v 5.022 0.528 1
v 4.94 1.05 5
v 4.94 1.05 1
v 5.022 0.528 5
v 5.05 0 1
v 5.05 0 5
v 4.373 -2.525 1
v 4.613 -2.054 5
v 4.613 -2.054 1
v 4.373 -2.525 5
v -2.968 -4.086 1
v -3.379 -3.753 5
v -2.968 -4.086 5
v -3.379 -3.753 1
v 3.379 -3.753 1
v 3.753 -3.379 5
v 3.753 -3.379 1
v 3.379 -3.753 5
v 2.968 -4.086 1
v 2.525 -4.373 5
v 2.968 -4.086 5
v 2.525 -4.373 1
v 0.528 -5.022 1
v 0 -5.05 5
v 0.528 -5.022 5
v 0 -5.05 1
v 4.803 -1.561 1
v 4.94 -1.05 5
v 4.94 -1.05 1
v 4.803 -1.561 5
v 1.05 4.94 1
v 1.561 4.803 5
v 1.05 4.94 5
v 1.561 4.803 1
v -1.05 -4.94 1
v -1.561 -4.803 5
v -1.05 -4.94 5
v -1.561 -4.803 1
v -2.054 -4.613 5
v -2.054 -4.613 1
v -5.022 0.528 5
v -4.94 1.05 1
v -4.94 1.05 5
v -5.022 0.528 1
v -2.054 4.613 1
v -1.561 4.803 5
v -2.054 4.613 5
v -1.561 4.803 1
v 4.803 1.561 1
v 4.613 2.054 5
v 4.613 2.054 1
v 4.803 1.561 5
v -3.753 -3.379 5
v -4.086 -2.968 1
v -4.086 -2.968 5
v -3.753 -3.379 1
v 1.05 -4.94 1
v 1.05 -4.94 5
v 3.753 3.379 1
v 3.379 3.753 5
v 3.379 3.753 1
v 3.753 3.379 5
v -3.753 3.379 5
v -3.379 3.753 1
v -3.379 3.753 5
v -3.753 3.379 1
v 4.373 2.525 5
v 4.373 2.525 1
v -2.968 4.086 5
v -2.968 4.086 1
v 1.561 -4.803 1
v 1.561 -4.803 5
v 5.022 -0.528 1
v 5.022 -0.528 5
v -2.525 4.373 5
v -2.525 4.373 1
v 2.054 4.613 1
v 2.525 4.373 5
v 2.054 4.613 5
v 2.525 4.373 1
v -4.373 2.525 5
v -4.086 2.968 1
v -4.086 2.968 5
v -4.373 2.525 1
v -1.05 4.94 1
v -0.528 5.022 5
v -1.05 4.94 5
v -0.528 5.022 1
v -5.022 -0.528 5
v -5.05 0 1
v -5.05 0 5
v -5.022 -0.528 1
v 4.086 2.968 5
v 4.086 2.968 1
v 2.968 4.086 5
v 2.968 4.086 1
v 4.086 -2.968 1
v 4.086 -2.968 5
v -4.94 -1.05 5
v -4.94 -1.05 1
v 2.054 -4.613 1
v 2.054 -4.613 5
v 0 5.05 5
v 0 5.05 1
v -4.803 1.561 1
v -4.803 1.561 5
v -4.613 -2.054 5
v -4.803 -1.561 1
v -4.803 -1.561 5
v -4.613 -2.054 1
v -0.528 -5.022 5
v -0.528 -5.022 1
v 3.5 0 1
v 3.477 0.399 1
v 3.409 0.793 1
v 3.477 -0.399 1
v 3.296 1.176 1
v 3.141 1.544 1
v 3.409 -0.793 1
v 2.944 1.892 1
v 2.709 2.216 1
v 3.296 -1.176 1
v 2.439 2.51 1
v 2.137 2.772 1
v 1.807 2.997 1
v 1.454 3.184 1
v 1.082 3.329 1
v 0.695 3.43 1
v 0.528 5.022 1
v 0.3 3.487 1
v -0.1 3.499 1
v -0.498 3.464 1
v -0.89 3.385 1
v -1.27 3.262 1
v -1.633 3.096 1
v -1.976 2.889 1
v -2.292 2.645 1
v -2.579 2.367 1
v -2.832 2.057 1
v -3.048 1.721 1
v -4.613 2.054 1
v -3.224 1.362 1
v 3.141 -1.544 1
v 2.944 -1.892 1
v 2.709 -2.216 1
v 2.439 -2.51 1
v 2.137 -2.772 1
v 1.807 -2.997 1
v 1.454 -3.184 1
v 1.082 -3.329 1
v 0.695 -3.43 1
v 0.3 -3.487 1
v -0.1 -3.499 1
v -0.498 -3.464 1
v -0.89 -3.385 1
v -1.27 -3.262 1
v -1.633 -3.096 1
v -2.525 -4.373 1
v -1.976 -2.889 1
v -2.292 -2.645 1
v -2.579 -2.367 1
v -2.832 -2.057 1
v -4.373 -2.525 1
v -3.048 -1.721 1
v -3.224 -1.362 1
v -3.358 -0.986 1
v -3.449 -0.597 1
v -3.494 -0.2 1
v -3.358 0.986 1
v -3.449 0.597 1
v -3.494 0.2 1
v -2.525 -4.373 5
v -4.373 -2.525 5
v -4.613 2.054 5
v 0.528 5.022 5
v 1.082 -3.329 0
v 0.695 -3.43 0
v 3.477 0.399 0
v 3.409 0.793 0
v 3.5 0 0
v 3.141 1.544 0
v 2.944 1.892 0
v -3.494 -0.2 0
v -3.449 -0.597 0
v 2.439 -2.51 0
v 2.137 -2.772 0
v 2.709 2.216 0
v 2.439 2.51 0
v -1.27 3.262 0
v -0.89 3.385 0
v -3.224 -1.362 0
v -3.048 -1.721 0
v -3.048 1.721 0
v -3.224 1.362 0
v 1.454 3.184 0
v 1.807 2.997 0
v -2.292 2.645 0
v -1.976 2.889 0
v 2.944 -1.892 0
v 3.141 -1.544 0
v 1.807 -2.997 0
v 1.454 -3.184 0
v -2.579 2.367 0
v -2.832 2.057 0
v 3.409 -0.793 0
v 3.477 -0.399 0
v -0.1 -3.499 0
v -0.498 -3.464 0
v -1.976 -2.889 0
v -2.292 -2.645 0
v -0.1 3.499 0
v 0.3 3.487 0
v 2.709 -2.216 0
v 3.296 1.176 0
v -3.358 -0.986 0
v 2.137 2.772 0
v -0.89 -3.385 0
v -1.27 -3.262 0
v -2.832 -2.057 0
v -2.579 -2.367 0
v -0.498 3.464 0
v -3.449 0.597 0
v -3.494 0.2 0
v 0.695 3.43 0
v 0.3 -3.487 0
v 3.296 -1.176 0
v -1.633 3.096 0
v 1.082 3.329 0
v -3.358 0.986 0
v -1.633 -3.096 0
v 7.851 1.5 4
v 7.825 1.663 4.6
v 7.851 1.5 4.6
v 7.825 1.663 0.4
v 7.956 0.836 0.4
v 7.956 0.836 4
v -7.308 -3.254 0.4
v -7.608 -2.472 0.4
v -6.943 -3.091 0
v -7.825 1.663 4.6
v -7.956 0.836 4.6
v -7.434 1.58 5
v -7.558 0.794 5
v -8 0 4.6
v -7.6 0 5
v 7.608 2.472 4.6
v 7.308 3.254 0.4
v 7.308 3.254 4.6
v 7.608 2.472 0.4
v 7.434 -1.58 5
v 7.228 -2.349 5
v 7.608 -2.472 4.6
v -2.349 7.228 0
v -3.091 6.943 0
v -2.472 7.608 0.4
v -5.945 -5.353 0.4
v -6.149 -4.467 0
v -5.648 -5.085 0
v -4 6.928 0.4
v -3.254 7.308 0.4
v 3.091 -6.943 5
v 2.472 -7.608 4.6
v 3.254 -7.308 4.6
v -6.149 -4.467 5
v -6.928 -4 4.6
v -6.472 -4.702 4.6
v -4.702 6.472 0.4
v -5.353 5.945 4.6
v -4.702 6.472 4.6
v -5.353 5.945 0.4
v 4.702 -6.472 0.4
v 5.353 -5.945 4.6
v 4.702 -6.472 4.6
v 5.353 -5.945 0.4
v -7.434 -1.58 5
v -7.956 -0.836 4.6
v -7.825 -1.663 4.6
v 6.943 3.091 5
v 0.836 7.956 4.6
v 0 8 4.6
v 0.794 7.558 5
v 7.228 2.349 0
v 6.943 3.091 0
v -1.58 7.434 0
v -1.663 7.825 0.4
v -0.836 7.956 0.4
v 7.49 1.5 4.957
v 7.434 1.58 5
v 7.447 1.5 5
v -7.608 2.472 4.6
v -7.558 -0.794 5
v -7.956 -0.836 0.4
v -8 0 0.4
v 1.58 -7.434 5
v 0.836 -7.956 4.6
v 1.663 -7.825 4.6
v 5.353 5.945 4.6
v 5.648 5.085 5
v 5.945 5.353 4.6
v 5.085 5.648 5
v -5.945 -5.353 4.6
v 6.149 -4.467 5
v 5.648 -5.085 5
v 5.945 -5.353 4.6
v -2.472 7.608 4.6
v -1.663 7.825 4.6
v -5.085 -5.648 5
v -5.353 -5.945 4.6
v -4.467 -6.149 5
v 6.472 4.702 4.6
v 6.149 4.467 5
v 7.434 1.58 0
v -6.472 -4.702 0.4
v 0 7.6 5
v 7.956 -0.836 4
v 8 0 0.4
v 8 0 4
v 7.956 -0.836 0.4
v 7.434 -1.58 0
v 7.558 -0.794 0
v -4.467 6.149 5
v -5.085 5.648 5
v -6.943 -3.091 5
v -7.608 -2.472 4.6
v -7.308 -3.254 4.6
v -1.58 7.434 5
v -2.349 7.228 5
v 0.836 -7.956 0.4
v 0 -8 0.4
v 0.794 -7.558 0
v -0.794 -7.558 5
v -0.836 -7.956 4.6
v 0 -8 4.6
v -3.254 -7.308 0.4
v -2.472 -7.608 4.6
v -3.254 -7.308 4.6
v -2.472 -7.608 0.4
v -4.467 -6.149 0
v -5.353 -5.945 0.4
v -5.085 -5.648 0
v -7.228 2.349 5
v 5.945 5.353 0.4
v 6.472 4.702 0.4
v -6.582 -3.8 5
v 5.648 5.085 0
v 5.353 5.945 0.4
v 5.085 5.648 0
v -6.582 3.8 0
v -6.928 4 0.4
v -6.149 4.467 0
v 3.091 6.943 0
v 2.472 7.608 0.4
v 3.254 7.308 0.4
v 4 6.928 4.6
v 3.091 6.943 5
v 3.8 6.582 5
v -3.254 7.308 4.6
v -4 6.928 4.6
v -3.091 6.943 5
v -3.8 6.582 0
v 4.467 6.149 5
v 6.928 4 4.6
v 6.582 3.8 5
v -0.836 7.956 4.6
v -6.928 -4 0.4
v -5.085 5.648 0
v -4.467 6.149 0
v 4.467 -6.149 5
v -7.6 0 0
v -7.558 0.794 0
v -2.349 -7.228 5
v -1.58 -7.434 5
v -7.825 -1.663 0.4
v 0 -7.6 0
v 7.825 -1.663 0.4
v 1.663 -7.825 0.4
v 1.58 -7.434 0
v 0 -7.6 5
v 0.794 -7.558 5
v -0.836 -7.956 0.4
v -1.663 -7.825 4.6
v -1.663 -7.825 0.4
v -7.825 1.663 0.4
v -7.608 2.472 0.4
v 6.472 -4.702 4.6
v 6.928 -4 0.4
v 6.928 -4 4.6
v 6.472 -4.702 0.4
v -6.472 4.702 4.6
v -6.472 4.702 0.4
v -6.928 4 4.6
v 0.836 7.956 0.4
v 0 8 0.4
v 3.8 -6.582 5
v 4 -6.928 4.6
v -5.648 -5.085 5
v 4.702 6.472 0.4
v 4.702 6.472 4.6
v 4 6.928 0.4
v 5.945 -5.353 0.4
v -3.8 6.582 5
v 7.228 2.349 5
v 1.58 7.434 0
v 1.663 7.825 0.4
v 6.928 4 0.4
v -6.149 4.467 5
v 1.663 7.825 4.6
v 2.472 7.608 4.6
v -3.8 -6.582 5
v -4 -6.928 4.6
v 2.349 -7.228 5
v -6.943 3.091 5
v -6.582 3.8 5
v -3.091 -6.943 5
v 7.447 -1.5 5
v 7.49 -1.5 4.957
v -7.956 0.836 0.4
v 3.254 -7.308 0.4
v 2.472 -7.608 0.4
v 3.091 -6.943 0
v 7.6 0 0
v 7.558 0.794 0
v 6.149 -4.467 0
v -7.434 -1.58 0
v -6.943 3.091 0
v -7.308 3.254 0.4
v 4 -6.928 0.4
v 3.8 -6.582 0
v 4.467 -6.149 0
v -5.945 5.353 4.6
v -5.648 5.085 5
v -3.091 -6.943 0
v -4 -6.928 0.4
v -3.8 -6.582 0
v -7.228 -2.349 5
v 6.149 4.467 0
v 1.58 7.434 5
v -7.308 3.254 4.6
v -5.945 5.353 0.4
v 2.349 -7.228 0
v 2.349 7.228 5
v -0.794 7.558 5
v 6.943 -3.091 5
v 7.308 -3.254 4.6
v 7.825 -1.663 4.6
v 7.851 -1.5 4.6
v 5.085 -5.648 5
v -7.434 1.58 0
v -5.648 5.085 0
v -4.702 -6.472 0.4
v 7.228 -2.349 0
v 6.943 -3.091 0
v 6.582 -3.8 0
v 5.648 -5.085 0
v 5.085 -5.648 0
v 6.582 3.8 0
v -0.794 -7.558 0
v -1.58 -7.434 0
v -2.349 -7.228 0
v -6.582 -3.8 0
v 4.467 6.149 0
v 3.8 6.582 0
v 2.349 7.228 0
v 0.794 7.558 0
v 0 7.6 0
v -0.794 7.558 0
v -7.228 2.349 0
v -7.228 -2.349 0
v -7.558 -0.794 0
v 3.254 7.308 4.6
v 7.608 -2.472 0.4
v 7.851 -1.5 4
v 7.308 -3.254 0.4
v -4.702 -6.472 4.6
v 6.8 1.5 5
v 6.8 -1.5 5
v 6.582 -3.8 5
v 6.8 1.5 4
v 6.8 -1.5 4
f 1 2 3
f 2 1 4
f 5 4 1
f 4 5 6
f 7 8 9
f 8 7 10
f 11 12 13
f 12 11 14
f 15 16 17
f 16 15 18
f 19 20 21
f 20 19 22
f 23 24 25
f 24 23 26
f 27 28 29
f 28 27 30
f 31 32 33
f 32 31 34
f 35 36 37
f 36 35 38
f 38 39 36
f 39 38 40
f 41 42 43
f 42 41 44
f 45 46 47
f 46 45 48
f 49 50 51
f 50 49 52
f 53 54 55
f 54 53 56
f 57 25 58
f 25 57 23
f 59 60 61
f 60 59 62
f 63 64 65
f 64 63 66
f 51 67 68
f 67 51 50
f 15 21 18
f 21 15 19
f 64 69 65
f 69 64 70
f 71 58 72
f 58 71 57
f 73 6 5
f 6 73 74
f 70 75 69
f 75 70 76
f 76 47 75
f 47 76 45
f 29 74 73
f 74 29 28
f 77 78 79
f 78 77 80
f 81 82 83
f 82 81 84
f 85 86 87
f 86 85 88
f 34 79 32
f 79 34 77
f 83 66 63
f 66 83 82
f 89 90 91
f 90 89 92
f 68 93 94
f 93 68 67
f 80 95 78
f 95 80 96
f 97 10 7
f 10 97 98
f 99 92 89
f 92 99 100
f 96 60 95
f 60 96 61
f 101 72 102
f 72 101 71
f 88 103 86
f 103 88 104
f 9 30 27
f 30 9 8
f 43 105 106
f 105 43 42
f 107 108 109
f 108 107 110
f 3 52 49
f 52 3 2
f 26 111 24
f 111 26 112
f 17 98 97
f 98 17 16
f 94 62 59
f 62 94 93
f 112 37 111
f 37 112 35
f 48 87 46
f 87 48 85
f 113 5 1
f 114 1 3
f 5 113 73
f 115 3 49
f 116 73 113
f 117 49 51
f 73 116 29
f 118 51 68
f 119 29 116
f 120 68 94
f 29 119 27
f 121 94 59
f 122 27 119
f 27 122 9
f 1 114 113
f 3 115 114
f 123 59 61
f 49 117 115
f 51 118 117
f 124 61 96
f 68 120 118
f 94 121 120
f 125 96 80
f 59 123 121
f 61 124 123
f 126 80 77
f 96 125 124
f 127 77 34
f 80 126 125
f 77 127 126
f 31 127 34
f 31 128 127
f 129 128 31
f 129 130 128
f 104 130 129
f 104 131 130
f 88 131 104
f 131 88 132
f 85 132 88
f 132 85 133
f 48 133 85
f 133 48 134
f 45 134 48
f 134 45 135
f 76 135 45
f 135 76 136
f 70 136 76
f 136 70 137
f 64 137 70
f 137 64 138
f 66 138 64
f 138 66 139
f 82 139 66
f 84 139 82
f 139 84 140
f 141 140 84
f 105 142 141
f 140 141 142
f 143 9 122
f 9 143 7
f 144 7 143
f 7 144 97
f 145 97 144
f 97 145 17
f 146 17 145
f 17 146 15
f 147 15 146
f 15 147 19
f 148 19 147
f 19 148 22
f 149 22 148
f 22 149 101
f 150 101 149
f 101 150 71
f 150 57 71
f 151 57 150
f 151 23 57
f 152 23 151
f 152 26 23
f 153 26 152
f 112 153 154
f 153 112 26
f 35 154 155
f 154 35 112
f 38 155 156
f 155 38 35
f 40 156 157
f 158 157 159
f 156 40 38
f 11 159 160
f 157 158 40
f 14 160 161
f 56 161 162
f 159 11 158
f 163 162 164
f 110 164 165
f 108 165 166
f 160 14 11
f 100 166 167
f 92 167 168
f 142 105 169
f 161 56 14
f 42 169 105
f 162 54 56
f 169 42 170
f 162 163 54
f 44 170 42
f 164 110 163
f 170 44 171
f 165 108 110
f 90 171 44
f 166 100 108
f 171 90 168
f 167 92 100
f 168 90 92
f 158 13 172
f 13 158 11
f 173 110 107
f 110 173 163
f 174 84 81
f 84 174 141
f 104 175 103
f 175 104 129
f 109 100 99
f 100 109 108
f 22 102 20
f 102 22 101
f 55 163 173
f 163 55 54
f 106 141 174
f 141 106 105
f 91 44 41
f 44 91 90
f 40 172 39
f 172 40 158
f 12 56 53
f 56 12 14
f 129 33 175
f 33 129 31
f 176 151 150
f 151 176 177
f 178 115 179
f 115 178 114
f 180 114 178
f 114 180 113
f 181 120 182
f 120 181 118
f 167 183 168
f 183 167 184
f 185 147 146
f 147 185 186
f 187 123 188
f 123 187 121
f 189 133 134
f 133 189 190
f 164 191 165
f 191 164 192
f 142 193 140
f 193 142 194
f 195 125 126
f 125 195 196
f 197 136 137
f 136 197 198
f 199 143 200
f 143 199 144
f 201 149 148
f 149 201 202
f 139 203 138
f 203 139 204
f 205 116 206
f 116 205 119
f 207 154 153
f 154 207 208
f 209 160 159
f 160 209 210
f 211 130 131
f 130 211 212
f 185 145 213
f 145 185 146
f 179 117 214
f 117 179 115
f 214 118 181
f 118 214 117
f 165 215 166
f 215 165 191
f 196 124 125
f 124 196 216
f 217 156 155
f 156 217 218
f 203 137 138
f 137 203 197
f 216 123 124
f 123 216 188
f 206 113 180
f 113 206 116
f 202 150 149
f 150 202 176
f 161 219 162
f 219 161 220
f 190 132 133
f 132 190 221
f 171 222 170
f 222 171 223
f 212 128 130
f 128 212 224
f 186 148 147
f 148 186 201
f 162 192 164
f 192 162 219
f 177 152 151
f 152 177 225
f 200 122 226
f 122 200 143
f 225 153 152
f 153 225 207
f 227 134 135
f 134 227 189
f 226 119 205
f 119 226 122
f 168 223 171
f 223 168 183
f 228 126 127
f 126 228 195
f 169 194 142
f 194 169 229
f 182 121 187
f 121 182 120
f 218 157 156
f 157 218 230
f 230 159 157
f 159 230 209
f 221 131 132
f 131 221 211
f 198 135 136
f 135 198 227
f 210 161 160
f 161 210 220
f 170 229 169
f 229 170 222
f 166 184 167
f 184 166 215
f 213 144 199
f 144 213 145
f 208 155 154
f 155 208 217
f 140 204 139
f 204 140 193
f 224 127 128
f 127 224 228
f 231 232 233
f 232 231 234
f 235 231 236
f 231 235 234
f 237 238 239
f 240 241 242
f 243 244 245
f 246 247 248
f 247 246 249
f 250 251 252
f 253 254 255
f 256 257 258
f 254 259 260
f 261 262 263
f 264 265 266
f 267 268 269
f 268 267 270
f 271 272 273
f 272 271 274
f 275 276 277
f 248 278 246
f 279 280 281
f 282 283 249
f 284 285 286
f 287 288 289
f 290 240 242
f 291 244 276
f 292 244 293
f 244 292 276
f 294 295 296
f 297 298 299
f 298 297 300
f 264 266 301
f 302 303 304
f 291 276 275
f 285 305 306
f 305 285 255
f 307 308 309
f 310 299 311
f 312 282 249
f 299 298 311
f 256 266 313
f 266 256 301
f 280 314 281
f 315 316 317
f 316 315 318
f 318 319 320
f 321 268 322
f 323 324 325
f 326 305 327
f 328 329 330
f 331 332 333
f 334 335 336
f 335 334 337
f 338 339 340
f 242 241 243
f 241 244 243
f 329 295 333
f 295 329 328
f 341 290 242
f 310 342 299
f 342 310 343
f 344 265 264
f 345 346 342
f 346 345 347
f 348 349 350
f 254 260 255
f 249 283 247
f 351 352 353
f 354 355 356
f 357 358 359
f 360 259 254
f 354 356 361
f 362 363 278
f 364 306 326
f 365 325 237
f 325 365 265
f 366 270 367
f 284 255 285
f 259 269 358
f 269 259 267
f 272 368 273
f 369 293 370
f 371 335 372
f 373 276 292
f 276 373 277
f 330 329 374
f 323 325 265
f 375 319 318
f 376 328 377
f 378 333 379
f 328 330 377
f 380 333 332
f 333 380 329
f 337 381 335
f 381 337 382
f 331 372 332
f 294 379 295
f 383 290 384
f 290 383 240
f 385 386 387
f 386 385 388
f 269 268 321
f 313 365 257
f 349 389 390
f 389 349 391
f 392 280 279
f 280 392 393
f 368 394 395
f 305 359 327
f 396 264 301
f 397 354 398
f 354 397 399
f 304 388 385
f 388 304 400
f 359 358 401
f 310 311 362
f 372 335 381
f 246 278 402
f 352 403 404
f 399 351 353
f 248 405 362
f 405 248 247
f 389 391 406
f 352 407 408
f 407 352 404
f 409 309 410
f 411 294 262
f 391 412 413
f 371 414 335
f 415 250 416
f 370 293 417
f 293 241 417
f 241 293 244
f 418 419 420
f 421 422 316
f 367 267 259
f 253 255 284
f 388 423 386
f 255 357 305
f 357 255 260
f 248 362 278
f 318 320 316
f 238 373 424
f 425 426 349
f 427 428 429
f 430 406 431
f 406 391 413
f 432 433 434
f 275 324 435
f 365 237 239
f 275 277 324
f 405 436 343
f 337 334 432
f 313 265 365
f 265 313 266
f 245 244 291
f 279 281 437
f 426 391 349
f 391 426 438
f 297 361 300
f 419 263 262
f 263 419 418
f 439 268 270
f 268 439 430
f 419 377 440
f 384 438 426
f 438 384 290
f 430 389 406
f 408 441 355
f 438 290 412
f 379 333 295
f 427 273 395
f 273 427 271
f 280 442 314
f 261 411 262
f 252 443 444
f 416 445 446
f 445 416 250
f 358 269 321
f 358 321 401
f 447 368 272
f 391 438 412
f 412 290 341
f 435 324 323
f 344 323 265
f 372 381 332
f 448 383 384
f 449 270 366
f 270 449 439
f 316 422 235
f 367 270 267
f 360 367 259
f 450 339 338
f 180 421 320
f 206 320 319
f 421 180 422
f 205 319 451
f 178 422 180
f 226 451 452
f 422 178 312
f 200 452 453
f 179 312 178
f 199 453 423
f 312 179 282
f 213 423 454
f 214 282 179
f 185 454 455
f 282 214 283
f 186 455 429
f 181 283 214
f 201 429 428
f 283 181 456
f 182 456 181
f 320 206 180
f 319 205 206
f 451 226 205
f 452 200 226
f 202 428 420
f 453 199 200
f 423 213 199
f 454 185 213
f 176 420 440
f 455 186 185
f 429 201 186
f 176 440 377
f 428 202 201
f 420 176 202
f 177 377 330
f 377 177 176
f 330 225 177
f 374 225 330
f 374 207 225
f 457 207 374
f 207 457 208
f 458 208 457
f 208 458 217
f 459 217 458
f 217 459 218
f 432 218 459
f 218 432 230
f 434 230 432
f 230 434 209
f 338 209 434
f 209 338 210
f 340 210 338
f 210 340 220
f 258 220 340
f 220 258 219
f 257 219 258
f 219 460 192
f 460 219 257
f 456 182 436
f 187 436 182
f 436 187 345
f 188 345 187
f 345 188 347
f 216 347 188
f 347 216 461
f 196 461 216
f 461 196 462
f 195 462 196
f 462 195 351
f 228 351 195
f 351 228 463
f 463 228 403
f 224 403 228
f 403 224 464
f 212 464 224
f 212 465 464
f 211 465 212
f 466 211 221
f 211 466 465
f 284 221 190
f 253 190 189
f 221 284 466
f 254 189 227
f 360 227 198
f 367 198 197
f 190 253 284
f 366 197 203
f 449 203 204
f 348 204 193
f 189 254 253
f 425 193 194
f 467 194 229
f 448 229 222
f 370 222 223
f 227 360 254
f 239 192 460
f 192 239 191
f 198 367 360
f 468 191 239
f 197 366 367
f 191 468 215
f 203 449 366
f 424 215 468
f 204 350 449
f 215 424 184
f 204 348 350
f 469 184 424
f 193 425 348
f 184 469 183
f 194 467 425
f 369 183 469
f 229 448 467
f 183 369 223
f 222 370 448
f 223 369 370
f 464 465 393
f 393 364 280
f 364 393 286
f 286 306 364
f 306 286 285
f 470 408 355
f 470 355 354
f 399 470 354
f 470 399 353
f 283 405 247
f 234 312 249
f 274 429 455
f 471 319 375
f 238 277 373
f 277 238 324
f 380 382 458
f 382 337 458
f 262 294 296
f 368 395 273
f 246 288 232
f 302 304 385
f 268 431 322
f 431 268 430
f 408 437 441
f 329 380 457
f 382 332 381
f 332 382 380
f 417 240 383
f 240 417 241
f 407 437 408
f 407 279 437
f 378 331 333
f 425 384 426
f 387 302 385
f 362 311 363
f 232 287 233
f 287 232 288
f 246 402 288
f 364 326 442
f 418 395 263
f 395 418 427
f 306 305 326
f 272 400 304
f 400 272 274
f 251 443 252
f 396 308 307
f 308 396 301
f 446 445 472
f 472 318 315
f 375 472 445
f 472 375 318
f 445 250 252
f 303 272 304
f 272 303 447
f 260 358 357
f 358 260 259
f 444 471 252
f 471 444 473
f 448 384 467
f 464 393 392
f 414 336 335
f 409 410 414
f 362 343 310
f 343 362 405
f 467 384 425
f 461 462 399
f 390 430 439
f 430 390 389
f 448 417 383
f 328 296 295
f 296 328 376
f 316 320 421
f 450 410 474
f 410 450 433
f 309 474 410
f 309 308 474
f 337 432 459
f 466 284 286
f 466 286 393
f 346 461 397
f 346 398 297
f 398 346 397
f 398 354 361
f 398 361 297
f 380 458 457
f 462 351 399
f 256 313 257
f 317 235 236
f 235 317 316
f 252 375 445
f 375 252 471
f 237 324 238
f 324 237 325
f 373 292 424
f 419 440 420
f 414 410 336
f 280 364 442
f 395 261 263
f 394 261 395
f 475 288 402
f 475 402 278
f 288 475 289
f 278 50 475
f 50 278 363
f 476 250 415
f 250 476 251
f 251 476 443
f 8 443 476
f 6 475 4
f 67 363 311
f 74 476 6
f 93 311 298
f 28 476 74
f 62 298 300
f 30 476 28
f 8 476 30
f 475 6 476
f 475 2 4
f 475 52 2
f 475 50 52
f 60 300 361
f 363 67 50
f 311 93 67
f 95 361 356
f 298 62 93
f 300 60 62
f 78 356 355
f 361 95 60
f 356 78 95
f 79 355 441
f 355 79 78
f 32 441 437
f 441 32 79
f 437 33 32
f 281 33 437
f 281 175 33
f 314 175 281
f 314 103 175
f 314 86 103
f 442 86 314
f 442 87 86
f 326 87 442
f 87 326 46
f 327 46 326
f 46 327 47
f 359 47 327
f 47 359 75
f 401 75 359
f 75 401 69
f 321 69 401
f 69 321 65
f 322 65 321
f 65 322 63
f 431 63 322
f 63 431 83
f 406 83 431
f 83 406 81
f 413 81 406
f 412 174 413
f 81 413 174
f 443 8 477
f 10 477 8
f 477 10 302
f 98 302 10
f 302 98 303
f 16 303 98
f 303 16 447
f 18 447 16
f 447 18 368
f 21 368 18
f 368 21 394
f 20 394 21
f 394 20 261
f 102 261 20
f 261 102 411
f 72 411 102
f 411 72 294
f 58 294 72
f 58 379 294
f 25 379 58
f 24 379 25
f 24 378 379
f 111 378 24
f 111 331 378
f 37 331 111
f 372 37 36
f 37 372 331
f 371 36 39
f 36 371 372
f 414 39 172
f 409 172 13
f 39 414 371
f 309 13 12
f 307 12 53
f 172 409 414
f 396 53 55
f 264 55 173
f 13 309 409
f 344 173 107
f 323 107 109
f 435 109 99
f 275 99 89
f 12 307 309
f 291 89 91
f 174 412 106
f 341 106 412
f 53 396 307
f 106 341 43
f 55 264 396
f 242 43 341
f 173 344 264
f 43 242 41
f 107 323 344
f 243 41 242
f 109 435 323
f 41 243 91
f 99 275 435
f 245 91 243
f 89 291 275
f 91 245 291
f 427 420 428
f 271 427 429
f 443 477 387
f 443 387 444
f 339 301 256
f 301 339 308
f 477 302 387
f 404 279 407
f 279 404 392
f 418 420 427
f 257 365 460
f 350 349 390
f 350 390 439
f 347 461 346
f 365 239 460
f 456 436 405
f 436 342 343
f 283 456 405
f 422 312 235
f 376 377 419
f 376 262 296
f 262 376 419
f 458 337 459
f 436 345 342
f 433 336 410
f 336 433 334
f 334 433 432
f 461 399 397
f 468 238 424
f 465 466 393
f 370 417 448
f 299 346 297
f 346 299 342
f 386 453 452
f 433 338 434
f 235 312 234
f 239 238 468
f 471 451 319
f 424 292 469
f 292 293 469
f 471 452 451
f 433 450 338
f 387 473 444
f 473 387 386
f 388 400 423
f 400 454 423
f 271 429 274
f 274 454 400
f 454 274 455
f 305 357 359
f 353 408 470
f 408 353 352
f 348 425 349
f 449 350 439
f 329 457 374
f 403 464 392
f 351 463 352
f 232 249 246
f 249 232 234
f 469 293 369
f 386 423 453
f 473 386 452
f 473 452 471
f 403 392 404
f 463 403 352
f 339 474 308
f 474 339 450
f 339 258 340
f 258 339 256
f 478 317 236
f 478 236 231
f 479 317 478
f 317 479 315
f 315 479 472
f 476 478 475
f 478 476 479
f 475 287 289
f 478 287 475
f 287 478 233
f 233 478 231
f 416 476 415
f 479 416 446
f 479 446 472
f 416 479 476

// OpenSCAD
// file: ../stem_core.scad
// =====================================================================
//  stem_core.scad — shared geometry helpers for every STEM_KIT part.
// =====================================================================
include <../PARAMETERS/config.scad>
// =====================================================================

// ---------- rounded / chamfered prisms --------------------------------

// Rounded rectangle (2D), centred.
module rrect(size, r) {
    rr = min(r, min(size[0], size[1]) / 2 - 0.01);
    offset(r = rr) square([size[0] - 2 * rr, size[1] - 2 * rr], center = true);
}

// Box with rounded vertical edges, chamfered bottom edge (elephant-foot
// relief) and rounded-ish (chamfered) top edge. Sits on z = 0, centred XY.
module rbox(size, r = 2, top = edge_r, bottom = chamfer) {
    h = size[2];
    hull() {
        linear_extrude(0.01) rrect([size[0] - 2 * bottom, size[1] - 2 * bottom], max(r - bottom, 0.1));
        translate([0, 0, bottom]) linear_extrude(h - bottom - top) rrect([size[0], size[1]], r);
        translate([0, 0, h - 0.01]) linear_extrude(0.01) rrect([size[0] - 2 * top, size[1] - 2 * top], max(r - top, 0.1));
    }
}

// Cylinder with chamfered/rounded top and bottom edges (safe hubs, knobs).
module rcyl(d, h, top = edge_r, bottom = chamfer) {
    rotate_extrude() polygon([
        [0, 0], [d / 2 - bottom, 0], [d / 2, bottom],
        [d / 2, h - top], [d / 2 - top, h], [0, h]
    ]);
}

// Stadium (slot / rounded bar) 2D between two points on the X axis.
module stadium2d(len, w) {
    hull() { circle(d = w); translate([len, 0]) circle(d = w); }
}

// ---------- holes ------------------------------------------------------

// Vertical through hole with small top/bottom chamfers.
module vhole(d = grid_hole_d, h = 50, ch = 0.4) {
    translate([0, 0, -h / 2]) cylinder(d = d, h = h);
}

// Horizontal hole along +Y, printable without supports (teardrop tip up).
module teardrop_y(d, len, center = true) {
    translate([0, center ? -len / 2 : 0, 0]) rotate([-90, 0, 0])
        linear_extrude(len) teardrop2d(d);
}
module teardrop_x(d, len, center = true) {
    translate([center ? -len / 2 : 0, 0, 0]) rotate([0, 90, 0]) rotate([0, 0, -90])
        linear_extrude(len) teardrop2d(d);
}
// 2D teardrop: circle + 45° roof pointing "up" in the final part (+Z).
// After rotate([-90,0,0]) local +Y becomes -Z, so the roof points to -Y here.
module teardrop2d(d) {
    r = d / 2;
    union() {
        circle(d = d);
        polygon([[-r * sqrt(2) / 2, -r * sqrt(2) / 2], [0, -r * sqrt(2)], [r * sqrt(2) / 2, -r * sqrt(2) / 2]]);
    }
}

// Hex nut pocket (flat sides parallel to X), opening at z = 0 going +Z.
module nut_pocket(depth = nut_pocket_depth, af = nut_pocket_af) {
    cylinder(d = af / cos(30), h = depth, $fn = 6);
}

// Side-entry nut slot: nut plane is XY, slot opens toward +dir (X).
// Centred on the screw axis (Z), slot height nut_slot_t, runs out `len`.
module nut_slot_x(len = 10, af = nut_pocket_af, t = nut_slot_t) {
    translate([0, 0, -t / 2]) hull() {
        cylinder(d = af / cos(30), h = t, $fn = 6);
        translate([len, 0, 0]) cylinder(d = af / cos(30), h = t, $fn = 6);
    }
}

// Counterbored clearance hole from top surface at height `top` downward.
module cbore(top, depth, d = counterbore_d) {
    translate([0, 0, top - depth]) cylinder(d = d, h = depth + 20);
    translate([0, 0, -20]) cylinder(d = grid_hole_d, h = top + 40);
}

// Grid of vertical holes: nx x ny, pitch grid_pitch, first hole centred
// at `origin` (XY). Used by every plate.
module grid_holes(nx, ny, origin = [0, 0], h = 100, d = grid_hole_d) {
    for (i = [0 : nx - 1], j = [0 : ny - 1])
        translate([origin[0] + i * grid_pitch, origin[1] + j * grid_pitch, 0]) vhole(d, h);
}

// Slot (for adjustable mounting) along X, length = travel.
module slot_x(travel, d = grid_hole_d, h = 100) {
    translate([-travel / 2, 0, -h / 2]) linear_extrude(h) stadium2d(travel, d);
}

// ---------- shaft bores ------------------------------------------------

// 2D bore profile: round, or D if shaft_flat > 0.
module bore2d(d) {
    if (shaft_flat > 0)
        intersection() { circle(d = d); translate([-d, -d / 2]) square([2 * d, d - shaft_flat + (d - shaft_diameter) / 2]); }
    else circle(d = d);
}

// Standard HUB: cylinder hub_d x hub_h standing on z = z0, with bore,
// radial M3 set screw at mid height and a captive-nut slot from the top.
// Call inside difference() for the cut-outs: hub_body()/hub_cuts().
module hub_body(z0, d = hub_d, h = hub_h) {
    translate([0, 0, z0]) rcyl(d, h, top = 0.8, bottom = 0);
}
module hub_cuts(z0, total_h, d = hub_d, h = hub_h, bore = shaft_fixed_bore, set_screw = true, screw_angle = 0) {
    // bore through everything
    translate([0, 0, -1]) linear_extrude(total_h + 2) bore2d(bore);
    // entry chamfer on bore
    translate([0, 0, total_h - 0.6]) cylinder(d1 = bore, d2 = bore + 1.2, h = 0.61);
    translate([0, 0, -0.01]) cylinder(d1 = bore + 1.2, d2 = bore, h = 0.6);
    if (set_screw) rotate([0, 0, screw_angle]) {
        zs = z0 + h / 2;
        // radial screw hole (teardrop, prints without support)
        translate([0, 0, zs]) teardrop_x(screw_clear_d, d, center = false);
        // captive nut slot, entered from the hub top face
        nr = bore / 2 + (d / 2 - bore / 2) / 2;       // radial position of nut
        translate([nr - nut_slot_t / 2, -nut_pocket_af / 2, zs - nut_pocket_af / cos(30) / 2 - 0.1])
            cube([nut_slot_t, nut_pocket_af, total_h + 10]);   // open to the hub top face
    }
}

// ---------- labels -----------------------------------------------------

// Engrave text into a top surface at height z (depth 0.6 = 3 layers).
module engrave(txt, size = 5, z = 0, depth = 0.6, halign = "center") {
    translate([0, 0, z - depth]) linear_extrude(depth + 1)
        text(txt, size = size, font = "Liberation Sans:style=Bold", halign = halign, valign = "center");
}

// ---------- misc -------------------------------------------------------

function grid_snap(v) = ceil(v / grid_pitch) * grid_pitch;
// file: ../../PARAMETERS/config.scad
// =====================================================================
//  STEM_KIT — CENTRAL PARAMETER FILE  ("ForgeGrid" mechanical standard)
// ---------------------------------------------------------------------
//  Every part in the library includes this file. Change a value here,
//  run `python3 tools/build.py`, and the whole library regenerates.
//  All dimensions in millimetres.
// =====================================================================

// ---------------------------------------------------------------------
// 1. PRINTER / PROCESS
// ---------------------------------------------------------------------
nozzle          = 0.4;
layer_height    = 0.2;
tolerance       = 0.2;    // sliding clearance per side (tune with STEM_TOLERANCE_TEST)
press_allow     = 0.05;   // extra for press fits (bores that should grip)
min_wall        = 1.6;    // never go below this
wall_thickness  = 2.4;    // preferred wall (6 perimeters @ 0.4)
edge_r          = 1.0;    // rounding of exposed edges (child safety)
chamfer         = 0.6;    // bottom-edge chamfer (elephant-foot relief)

$fa = 6;                  // facet angle
$fs = 0.4;                // facet size

// ---------------------------------------------------------------------
// 2. GRID  (the heart of the ecosystem)
// ---------------------------------------------------------------------
//  Holes sit on a 10 mm lattice, 5 mm in from every plate edge, so
//  plates placed side by side keep one continuous lattice.
grid_pitch            = 10;
plate_size            = 100;   // universal base plate (square)
plate_thickness       = 6;     // base plates, rails, chassis
foot_thickness        = 4;     // flange / foot of every mount
//  => standard joint: 4 mm foot + 6 mm plate = M3 x 10 screw, nut in
//     the hex pocket under the plate. One screw length does 90 % of joints.

// ---------------------------------------------------------------------
// 3. FASTENERS (M3 everywhere: one screwdriver, one nut)
// ---------------------------------------------------------------------
screw_size            = 3;
screw_clear_d         = 3.4;   // clearance hole (also the grid hole)
grid_hole_d           = screw_clear_d;
screw_tap_d           = 2.6;   // hole a screw self-taps into
screw_head_d          = 5.7;   // ISO 7380 BUTTON head = kit standard (low, rounded, child-safe)
screw_head_h          = 1.65;
counterbore_d         = 6.4;
nut_af                = 5.5;   // M3 nut across flats
nut_thick             = 2.4;
nut_pocket_af         = nut_af + 0.35;
nut_pocket_depth      = 3.0;   // pocket under plates (nut sits flush)
nut_slot_t            = nut_thick + 0.4;  // side-entry slot thickness
set_screw_len         = 6;     // M3 x 6 grub screw for hubs

// ---------------------------------------------------------------------
// 4. SHAFTS
// ---------------------------------------------------------------------
//  Default: 3 mm steel rod (silver steel / stainless). Printed shafts
//  are provided for light-duty use. Alternative systems: set
//  shaft_diameter = 4 or 5 and rebuild.
shaft_diameter        = 3;
shaft_flat            = 0;     // >0 : D-shaft, flat depth (e.g. 0.5)
shaft_fixed_bore      = shaft_diameter + 0.15;  // hub bore (set-screw locked)
shaft_free_bore       = shaft_diameter + 0.4;   // free-spinning bore / bushing
shaft_lengths         = [40, 60, 80, 100, 120];

//  Horizontal shafts: all pillow blocks, motor mounts and axle mounts
//  put their axis at this height above the surface they are bolted to,
//  so any two of them on the grid are automatically coaxial/parallel.
axis_height           = 17;
axis_height_high      = 37;    // = axis_height + 2 pitches (pulleys, big wheels)

// ---------------------------------------------------------------------
// 5. BEARINGS
// ---------------------------------------------------------------------
bearing_size          = [5, 16, 5];   // 625 : bore, OD, width (default housing)
bearing_small         = [3, 10, 4];   // 623 : fits 3 mm shafts via adapter ring
bearing_pocket_d      = bearing_size[1] + 0.15;

// ---------------------------------------------------------------------
// 6. GEARS
// ---------------------------------------------------------------------
//  Module 2 + tooth counts that are multiples of 10  =>  centre distance
//  = (z1+z2) mm is ALWAYS a multiple of 10  =>  ANY two gears mesh when
//  their shafts sit in grid holes. (3-4-5 diagonals also work: 50 mm.)
gear_module           = 2;
gear_pressure_angle   = 20;
gear_width            = 6;
gear_backlash         = 0.30;  // total circular backlash per mesh
gear_clearance_k      = 0.25;  // root clearance = k * module
gear_teeth_set        = [10, 20, 30, 40];
//  Gearbox frame: two frame plates, outer faces 60 mm apart (on grid),
//  48 mm gap = three gear levels (A, M, B).
frame_gap             = 48;
hub_d                 = 14;
hub_h                 = 7;

// ---------------------------------------------------------------------
// 7. WHEELS / PULLEYS
// ---------------------------------------------------------------------
wheel_diameter        = 60;
wheel_width           = 10;
axle_diameter         = shaft_diameter;
oring_cs              = 3.0;    // O-ring cross-section used as tyre / belt
belt_cs               = 2.5;    // O-ring / round-belt cord for pulleys
pulley_sizes          = [20, 40, 60];  // effective (belt-line) diameters

// ---------------------------------------------------------------------
// 8. MOTORS (130-size toy / solar motor is the default)
// ---------------------------------------------------------------------
motor_size            = [20.2, 15.2, 25.2]; // body dia, across-flats, length
motor_d               = motor_size[0];
motor_flat            = motor_size[1];
motor_len             = motor_size[2];
motor_boss_d          = 6.2;
motor_boss_h          = 1.6;
motor_shaft_d         = 2.0;
motor_shaft_len       = 8.5;   // beyond boss
motor_shaft_bore      = 1.9;   // press fit onto 2 mm motor shaft

// ---------------------------------------------------------------------
// 9. SOLAR PANEL (bought, not printed) — frame is parametric
// ---------------------------------------------------------------------
solar_panel_size      = [110, 69, 3.0];  // 5 V 1 W epoxy panel (common)
solar_panel_clear     = 0.6;

// ---------------------------------------------------------------------
// 10. ELECTRONICS
// ---------------------------------------------------------------------
mounting_hole_spacing = grid_pitch;   // everything bolts to the grid
electronics_slot_w    = screw_clear_d;
led_hole_d            = 5.1;
buzzer_hole_d         = 12.2;

// ---------------------------------------------------------------------
// 11. SAFETY LIMITS (checked by tools/qc.py)
// ---------------------------------------------------------------------
max_part_voltage      = 12;    // nothing in this kit uses more
min_rim_thickness     = 2.0;   // blades/links: no edge thinner than this
finger_gap_max        = 6;     // guard openings smaller than a child's finger
// main file
// =====================================================================
//  PART: bearing inserts — COMMON/bearings
//  Drop into the 16 mm pocket of any bearing mount:
//    type = "623"     adapter ring for a 623 (3x10x4) ball bearing
//    type = "bushing" printed plain bearing for a 3 mm shaft (no bearing)
//  Print: flat, shoulder down. No supports.
// =====================================================================
include <../../PARAMETERS/config.scad>
use <../stem_core.scad>

type = "623";
bearing_insert(type);

module bearing_insert(type) {
    od = bearing_size[1];
    h  = bearing_size[2];
    difference() {
        rcyl(od, h, top = 0.4, bottom = 0.4);
        if (type == "623") {
            // bearing seat from top, 1 mm shoulder at the bottom
            translate([0, 0, 1]) cylinder(d = bearing_small[1] + 0.1, h = h);
            translate([0, 0, -1]) cylinder(d = bearing_small[1] - 3, h = h + 2);
        } else {
            translate([0, 0, -1]) cylinder(d = shaft_free_bore - 0.1, h = h + 2);
            // oil groove
            translate([0, 0, h / 2]) rotate_extrude() translate([(shaft_free_bore - 0.1) / 2, 0]) circle(d = 0.8, $fn = 12);
            for (z = [-0.01, h - 0.4]) translate([0, 0, z]) cylinder(d1 = shaft_free_bore + (z < 0 ? 0.8 : 0), d2 = shaft_free_bore + (z < 0 ? 0 : 0.8), h = 0.41);
        }
        // grip slot to pull the insert back out
        translate([od / 2 - 1.2, -1.5, h - 1]) cube([3, 3, 2]);
    }
}
